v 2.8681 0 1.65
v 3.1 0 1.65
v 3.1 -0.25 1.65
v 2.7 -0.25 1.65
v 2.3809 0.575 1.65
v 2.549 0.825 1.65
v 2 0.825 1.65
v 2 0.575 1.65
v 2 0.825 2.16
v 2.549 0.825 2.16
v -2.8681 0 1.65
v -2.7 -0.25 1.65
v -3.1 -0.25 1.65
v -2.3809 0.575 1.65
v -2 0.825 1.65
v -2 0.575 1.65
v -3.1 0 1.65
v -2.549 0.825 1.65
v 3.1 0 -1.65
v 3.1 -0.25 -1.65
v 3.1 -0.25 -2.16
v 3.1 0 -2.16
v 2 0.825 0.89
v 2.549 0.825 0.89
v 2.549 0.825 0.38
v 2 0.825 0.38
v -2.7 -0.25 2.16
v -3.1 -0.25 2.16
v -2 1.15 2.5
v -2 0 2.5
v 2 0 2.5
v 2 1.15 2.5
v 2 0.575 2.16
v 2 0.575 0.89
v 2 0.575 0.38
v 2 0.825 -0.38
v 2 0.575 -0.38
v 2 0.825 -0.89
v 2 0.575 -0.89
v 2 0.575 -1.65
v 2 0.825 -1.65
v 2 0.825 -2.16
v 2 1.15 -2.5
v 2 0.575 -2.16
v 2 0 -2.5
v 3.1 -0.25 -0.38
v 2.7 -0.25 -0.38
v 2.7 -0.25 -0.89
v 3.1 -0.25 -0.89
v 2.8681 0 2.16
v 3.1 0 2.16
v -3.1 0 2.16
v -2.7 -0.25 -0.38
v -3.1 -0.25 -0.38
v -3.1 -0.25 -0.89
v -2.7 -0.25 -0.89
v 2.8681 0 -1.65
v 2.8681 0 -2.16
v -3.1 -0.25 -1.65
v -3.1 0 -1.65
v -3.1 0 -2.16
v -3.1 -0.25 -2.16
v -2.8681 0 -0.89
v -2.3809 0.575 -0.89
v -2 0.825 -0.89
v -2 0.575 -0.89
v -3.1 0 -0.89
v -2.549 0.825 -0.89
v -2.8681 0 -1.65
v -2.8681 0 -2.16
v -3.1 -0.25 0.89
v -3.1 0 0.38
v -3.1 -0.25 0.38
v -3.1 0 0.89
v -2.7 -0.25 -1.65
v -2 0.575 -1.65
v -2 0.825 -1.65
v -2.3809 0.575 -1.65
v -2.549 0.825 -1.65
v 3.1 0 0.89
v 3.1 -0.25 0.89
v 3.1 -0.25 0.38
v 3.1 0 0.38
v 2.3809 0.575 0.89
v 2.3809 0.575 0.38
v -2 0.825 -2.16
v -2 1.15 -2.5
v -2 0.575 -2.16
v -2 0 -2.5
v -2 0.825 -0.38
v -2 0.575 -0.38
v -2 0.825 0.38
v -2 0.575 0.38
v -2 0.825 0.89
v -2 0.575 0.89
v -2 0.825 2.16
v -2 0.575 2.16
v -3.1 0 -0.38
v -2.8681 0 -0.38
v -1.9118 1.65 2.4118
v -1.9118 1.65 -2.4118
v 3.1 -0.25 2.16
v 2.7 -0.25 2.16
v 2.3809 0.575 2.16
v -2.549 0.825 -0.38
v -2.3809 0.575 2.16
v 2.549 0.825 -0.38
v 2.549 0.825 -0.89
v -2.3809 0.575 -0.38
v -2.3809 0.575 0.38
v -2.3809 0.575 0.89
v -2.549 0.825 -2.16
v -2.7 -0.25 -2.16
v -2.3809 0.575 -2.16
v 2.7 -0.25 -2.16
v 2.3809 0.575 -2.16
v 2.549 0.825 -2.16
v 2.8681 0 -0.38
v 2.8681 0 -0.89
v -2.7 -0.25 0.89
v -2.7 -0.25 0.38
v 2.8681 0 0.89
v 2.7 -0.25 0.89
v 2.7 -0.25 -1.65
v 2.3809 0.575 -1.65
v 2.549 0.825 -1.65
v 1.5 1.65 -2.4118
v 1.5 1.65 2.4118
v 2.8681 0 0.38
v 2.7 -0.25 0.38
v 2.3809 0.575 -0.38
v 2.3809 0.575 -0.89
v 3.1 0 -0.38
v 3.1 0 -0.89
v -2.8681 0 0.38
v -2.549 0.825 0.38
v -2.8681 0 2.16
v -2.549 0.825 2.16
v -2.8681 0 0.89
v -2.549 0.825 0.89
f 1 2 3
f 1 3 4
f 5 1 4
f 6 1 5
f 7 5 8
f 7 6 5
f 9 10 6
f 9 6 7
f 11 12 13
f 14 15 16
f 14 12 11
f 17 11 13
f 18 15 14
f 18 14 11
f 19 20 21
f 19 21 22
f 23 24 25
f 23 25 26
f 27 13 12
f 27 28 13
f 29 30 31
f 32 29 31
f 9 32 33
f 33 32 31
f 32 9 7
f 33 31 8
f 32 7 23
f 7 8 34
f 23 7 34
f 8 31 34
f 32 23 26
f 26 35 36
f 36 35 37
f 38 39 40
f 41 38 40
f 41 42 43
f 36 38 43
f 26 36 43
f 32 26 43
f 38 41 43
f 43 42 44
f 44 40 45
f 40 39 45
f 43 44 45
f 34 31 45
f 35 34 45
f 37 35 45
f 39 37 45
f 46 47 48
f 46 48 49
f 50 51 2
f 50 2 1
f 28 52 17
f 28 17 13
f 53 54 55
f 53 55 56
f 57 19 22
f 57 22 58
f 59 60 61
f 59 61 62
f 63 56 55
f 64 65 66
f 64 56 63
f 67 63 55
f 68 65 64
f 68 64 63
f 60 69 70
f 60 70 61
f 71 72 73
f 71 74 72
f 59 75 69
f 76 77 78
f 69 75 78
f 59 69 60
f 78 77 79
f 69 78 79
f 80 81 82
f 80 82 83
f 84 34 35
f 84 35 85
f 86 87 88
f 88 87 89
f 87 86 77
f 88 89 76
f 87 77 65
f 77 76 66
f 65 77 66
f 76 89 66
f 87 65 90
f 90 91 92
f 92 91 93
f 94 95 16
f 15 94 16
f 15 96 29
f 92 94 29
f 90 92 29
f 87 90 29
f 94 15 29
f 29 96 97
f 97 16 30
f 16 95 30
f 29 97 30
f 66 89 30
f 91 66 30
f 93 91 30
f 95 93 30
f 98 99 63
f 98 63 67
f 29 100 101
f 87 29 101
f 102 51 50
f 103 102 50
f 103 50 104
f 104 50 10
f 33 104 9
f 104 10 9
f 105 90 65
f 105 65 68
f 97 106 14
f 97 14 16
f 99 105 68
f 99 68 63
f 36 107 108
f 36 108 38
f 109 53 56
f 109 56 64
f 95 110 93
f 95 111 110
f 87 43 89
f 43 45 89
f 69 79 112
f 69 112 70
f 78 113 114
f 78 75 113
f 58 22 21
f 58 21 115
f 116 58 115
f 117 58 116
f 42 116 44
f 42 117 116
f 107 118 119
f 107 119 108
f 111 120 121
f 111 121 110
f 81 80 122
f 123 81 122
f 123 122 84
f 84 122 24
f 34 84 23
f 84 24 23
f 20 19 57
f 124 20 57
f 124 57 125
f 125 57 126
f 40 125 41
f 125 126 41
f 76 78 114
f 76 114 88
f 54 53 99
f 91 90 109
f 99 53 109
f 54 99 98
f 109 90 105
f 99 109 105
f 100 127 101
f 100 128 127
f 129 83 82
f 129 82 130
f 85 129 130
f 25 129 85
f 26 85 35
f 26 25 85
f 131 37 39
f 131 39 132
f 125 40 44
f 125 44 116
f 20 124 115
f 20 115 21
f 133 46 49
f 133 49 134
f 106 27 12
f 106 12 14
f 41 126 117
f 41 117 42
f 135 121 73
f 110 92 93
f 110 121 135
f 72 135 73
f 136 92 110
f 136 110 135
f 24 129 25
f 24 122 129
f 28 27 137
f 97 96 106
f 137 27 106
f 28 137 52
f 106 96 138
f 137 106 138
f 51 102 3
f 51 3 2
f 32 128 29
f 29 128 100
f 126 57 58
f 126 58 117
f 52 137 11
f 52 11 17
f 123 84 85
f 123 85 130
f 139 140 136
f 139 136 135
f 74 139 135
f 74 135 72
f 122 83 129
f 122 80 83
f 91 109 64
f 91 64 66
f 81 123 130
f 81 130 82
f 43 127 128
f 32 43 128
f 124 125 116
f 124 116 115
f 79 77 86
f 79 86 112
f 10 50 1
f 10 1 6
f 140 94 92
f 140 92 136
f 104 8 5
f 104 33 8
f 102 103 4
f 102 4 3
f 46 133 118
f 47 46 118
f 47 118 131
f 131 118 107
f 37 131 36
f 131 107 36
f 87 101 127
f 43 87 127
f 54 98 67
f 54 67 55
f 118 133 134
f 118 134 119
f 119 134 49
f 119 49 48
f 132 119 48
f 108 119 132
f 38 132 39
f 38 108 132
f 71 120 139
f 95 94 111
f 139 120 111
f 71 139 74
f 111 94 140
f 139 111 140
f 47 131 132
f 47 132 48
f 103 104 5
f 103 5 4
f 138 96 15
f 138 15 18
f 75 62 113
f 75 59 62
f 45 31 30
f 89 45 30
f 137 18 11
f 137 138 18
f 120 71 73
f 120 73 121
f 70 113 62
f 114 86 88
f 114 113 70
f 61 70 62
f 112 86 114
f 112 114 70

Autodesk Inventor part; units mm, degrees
ref_plane "YZ Plane" through (0, 0, 0) normal (1, 0, 0) x (0, 1, 0)
ref_plane "XZ Plane" through (0, 0, 0) normal (0, 1, 0) x (-1, 0, 0)
sketch "Sketch1" plane through (0, 0, 0) normal (0, 1, 0) x (-1, 0, 0)
  line L0 (2, 2.5) -> (-2, 2.5)
  line L1 (-2, 2.5) -> (-2, -2.5)
  line L2 (-2, -2.5) -> (2, -2.5)
  line L3 (2, -2.5) -> (2, 2.5)
  point P0 (0, 0)
  dimension "d0" = 4
  dimension "d1" = 5
  dimension "d2" = 2
  dimension "d3" = 2.5
extrude "Extrusion1" add sketch "Sketch1" along normal blind 1.65
chamfer "Chamfer1" distance 0.5 angle 10 1 edges at (0, 1.65, 2.5) measured on face at (-0.6667, 0.55, 2.5)
chamfer "Chamfer2" distance 0.5 angle 10 1 edges at (-2, 1.65, -0.0441) measured on face at (-2, 0.9333, -0.8333)
chamfer "Chamfer3" distance 0.5 angle 10 1 edges at (0.0441, 1.65, -2.5) measured on face at (0.6667, 0.9333, -2.5)
chamfer "Chamfer4" distance 0.5 angle 45 1 edges at (2, 1.65, 0) measured on face at (2, 0.3833, 0.8333)
ref_plane "Work Plane1" through (2, 0, -1.905) normal (0, 0, -1) x (-1, 0, 0)
sketch "Sketch2" plane through (2, 0, -1.905) normal (0, 0, -1) x (-1, 0, 0)
  line L0 (0, 0.825) -> (0, 0.575)
  line L1 (0, 0.575) -> (-0.3809, 0.575)
  line L2 (-0.3809, 0.575) -> (-0.7, -0.25)
  line L3 (-0.7, -0.25) -> (-1.1, -0.25)
  line L4 (-1.1, -0.25) -> (-1.1, 0)
  line L5 (-1.1, 0) -> (-0.8681, 0)
  line L6 (-0.8681, 0) -> (-0.549, 0.825)
  line L7 (-0.549, 0.825) -> (0, 0.825)
  line L8 (0, 0) -> (0, 1.15) projected
  line L9 (0, 0) -> (4, 0) projected
  point P0 (2, 0)
  dimension "d19" = 0
  dimension "d20" = 0.25
  dimension "d21" = 0.25
  dimension "d22" = 0.4
  dimension "d23" = 1.1
  dimension "d24" = 0.25
  dimension "d25" = 0.825
extrude "Extrusion2" add sketch "Sketch2" along normal mid plane 0.51
pattern_linear "Rectangular Pattern1" count 4 spacing 1.27 along (0, 0, 1) of "Extrusion2"
mirror "Mirror1" about plane through (0, 0, 0) normal (1, 0, 0) of "Extrusion2", "Rectangular Pattern1"
properties part number "MC34063"
